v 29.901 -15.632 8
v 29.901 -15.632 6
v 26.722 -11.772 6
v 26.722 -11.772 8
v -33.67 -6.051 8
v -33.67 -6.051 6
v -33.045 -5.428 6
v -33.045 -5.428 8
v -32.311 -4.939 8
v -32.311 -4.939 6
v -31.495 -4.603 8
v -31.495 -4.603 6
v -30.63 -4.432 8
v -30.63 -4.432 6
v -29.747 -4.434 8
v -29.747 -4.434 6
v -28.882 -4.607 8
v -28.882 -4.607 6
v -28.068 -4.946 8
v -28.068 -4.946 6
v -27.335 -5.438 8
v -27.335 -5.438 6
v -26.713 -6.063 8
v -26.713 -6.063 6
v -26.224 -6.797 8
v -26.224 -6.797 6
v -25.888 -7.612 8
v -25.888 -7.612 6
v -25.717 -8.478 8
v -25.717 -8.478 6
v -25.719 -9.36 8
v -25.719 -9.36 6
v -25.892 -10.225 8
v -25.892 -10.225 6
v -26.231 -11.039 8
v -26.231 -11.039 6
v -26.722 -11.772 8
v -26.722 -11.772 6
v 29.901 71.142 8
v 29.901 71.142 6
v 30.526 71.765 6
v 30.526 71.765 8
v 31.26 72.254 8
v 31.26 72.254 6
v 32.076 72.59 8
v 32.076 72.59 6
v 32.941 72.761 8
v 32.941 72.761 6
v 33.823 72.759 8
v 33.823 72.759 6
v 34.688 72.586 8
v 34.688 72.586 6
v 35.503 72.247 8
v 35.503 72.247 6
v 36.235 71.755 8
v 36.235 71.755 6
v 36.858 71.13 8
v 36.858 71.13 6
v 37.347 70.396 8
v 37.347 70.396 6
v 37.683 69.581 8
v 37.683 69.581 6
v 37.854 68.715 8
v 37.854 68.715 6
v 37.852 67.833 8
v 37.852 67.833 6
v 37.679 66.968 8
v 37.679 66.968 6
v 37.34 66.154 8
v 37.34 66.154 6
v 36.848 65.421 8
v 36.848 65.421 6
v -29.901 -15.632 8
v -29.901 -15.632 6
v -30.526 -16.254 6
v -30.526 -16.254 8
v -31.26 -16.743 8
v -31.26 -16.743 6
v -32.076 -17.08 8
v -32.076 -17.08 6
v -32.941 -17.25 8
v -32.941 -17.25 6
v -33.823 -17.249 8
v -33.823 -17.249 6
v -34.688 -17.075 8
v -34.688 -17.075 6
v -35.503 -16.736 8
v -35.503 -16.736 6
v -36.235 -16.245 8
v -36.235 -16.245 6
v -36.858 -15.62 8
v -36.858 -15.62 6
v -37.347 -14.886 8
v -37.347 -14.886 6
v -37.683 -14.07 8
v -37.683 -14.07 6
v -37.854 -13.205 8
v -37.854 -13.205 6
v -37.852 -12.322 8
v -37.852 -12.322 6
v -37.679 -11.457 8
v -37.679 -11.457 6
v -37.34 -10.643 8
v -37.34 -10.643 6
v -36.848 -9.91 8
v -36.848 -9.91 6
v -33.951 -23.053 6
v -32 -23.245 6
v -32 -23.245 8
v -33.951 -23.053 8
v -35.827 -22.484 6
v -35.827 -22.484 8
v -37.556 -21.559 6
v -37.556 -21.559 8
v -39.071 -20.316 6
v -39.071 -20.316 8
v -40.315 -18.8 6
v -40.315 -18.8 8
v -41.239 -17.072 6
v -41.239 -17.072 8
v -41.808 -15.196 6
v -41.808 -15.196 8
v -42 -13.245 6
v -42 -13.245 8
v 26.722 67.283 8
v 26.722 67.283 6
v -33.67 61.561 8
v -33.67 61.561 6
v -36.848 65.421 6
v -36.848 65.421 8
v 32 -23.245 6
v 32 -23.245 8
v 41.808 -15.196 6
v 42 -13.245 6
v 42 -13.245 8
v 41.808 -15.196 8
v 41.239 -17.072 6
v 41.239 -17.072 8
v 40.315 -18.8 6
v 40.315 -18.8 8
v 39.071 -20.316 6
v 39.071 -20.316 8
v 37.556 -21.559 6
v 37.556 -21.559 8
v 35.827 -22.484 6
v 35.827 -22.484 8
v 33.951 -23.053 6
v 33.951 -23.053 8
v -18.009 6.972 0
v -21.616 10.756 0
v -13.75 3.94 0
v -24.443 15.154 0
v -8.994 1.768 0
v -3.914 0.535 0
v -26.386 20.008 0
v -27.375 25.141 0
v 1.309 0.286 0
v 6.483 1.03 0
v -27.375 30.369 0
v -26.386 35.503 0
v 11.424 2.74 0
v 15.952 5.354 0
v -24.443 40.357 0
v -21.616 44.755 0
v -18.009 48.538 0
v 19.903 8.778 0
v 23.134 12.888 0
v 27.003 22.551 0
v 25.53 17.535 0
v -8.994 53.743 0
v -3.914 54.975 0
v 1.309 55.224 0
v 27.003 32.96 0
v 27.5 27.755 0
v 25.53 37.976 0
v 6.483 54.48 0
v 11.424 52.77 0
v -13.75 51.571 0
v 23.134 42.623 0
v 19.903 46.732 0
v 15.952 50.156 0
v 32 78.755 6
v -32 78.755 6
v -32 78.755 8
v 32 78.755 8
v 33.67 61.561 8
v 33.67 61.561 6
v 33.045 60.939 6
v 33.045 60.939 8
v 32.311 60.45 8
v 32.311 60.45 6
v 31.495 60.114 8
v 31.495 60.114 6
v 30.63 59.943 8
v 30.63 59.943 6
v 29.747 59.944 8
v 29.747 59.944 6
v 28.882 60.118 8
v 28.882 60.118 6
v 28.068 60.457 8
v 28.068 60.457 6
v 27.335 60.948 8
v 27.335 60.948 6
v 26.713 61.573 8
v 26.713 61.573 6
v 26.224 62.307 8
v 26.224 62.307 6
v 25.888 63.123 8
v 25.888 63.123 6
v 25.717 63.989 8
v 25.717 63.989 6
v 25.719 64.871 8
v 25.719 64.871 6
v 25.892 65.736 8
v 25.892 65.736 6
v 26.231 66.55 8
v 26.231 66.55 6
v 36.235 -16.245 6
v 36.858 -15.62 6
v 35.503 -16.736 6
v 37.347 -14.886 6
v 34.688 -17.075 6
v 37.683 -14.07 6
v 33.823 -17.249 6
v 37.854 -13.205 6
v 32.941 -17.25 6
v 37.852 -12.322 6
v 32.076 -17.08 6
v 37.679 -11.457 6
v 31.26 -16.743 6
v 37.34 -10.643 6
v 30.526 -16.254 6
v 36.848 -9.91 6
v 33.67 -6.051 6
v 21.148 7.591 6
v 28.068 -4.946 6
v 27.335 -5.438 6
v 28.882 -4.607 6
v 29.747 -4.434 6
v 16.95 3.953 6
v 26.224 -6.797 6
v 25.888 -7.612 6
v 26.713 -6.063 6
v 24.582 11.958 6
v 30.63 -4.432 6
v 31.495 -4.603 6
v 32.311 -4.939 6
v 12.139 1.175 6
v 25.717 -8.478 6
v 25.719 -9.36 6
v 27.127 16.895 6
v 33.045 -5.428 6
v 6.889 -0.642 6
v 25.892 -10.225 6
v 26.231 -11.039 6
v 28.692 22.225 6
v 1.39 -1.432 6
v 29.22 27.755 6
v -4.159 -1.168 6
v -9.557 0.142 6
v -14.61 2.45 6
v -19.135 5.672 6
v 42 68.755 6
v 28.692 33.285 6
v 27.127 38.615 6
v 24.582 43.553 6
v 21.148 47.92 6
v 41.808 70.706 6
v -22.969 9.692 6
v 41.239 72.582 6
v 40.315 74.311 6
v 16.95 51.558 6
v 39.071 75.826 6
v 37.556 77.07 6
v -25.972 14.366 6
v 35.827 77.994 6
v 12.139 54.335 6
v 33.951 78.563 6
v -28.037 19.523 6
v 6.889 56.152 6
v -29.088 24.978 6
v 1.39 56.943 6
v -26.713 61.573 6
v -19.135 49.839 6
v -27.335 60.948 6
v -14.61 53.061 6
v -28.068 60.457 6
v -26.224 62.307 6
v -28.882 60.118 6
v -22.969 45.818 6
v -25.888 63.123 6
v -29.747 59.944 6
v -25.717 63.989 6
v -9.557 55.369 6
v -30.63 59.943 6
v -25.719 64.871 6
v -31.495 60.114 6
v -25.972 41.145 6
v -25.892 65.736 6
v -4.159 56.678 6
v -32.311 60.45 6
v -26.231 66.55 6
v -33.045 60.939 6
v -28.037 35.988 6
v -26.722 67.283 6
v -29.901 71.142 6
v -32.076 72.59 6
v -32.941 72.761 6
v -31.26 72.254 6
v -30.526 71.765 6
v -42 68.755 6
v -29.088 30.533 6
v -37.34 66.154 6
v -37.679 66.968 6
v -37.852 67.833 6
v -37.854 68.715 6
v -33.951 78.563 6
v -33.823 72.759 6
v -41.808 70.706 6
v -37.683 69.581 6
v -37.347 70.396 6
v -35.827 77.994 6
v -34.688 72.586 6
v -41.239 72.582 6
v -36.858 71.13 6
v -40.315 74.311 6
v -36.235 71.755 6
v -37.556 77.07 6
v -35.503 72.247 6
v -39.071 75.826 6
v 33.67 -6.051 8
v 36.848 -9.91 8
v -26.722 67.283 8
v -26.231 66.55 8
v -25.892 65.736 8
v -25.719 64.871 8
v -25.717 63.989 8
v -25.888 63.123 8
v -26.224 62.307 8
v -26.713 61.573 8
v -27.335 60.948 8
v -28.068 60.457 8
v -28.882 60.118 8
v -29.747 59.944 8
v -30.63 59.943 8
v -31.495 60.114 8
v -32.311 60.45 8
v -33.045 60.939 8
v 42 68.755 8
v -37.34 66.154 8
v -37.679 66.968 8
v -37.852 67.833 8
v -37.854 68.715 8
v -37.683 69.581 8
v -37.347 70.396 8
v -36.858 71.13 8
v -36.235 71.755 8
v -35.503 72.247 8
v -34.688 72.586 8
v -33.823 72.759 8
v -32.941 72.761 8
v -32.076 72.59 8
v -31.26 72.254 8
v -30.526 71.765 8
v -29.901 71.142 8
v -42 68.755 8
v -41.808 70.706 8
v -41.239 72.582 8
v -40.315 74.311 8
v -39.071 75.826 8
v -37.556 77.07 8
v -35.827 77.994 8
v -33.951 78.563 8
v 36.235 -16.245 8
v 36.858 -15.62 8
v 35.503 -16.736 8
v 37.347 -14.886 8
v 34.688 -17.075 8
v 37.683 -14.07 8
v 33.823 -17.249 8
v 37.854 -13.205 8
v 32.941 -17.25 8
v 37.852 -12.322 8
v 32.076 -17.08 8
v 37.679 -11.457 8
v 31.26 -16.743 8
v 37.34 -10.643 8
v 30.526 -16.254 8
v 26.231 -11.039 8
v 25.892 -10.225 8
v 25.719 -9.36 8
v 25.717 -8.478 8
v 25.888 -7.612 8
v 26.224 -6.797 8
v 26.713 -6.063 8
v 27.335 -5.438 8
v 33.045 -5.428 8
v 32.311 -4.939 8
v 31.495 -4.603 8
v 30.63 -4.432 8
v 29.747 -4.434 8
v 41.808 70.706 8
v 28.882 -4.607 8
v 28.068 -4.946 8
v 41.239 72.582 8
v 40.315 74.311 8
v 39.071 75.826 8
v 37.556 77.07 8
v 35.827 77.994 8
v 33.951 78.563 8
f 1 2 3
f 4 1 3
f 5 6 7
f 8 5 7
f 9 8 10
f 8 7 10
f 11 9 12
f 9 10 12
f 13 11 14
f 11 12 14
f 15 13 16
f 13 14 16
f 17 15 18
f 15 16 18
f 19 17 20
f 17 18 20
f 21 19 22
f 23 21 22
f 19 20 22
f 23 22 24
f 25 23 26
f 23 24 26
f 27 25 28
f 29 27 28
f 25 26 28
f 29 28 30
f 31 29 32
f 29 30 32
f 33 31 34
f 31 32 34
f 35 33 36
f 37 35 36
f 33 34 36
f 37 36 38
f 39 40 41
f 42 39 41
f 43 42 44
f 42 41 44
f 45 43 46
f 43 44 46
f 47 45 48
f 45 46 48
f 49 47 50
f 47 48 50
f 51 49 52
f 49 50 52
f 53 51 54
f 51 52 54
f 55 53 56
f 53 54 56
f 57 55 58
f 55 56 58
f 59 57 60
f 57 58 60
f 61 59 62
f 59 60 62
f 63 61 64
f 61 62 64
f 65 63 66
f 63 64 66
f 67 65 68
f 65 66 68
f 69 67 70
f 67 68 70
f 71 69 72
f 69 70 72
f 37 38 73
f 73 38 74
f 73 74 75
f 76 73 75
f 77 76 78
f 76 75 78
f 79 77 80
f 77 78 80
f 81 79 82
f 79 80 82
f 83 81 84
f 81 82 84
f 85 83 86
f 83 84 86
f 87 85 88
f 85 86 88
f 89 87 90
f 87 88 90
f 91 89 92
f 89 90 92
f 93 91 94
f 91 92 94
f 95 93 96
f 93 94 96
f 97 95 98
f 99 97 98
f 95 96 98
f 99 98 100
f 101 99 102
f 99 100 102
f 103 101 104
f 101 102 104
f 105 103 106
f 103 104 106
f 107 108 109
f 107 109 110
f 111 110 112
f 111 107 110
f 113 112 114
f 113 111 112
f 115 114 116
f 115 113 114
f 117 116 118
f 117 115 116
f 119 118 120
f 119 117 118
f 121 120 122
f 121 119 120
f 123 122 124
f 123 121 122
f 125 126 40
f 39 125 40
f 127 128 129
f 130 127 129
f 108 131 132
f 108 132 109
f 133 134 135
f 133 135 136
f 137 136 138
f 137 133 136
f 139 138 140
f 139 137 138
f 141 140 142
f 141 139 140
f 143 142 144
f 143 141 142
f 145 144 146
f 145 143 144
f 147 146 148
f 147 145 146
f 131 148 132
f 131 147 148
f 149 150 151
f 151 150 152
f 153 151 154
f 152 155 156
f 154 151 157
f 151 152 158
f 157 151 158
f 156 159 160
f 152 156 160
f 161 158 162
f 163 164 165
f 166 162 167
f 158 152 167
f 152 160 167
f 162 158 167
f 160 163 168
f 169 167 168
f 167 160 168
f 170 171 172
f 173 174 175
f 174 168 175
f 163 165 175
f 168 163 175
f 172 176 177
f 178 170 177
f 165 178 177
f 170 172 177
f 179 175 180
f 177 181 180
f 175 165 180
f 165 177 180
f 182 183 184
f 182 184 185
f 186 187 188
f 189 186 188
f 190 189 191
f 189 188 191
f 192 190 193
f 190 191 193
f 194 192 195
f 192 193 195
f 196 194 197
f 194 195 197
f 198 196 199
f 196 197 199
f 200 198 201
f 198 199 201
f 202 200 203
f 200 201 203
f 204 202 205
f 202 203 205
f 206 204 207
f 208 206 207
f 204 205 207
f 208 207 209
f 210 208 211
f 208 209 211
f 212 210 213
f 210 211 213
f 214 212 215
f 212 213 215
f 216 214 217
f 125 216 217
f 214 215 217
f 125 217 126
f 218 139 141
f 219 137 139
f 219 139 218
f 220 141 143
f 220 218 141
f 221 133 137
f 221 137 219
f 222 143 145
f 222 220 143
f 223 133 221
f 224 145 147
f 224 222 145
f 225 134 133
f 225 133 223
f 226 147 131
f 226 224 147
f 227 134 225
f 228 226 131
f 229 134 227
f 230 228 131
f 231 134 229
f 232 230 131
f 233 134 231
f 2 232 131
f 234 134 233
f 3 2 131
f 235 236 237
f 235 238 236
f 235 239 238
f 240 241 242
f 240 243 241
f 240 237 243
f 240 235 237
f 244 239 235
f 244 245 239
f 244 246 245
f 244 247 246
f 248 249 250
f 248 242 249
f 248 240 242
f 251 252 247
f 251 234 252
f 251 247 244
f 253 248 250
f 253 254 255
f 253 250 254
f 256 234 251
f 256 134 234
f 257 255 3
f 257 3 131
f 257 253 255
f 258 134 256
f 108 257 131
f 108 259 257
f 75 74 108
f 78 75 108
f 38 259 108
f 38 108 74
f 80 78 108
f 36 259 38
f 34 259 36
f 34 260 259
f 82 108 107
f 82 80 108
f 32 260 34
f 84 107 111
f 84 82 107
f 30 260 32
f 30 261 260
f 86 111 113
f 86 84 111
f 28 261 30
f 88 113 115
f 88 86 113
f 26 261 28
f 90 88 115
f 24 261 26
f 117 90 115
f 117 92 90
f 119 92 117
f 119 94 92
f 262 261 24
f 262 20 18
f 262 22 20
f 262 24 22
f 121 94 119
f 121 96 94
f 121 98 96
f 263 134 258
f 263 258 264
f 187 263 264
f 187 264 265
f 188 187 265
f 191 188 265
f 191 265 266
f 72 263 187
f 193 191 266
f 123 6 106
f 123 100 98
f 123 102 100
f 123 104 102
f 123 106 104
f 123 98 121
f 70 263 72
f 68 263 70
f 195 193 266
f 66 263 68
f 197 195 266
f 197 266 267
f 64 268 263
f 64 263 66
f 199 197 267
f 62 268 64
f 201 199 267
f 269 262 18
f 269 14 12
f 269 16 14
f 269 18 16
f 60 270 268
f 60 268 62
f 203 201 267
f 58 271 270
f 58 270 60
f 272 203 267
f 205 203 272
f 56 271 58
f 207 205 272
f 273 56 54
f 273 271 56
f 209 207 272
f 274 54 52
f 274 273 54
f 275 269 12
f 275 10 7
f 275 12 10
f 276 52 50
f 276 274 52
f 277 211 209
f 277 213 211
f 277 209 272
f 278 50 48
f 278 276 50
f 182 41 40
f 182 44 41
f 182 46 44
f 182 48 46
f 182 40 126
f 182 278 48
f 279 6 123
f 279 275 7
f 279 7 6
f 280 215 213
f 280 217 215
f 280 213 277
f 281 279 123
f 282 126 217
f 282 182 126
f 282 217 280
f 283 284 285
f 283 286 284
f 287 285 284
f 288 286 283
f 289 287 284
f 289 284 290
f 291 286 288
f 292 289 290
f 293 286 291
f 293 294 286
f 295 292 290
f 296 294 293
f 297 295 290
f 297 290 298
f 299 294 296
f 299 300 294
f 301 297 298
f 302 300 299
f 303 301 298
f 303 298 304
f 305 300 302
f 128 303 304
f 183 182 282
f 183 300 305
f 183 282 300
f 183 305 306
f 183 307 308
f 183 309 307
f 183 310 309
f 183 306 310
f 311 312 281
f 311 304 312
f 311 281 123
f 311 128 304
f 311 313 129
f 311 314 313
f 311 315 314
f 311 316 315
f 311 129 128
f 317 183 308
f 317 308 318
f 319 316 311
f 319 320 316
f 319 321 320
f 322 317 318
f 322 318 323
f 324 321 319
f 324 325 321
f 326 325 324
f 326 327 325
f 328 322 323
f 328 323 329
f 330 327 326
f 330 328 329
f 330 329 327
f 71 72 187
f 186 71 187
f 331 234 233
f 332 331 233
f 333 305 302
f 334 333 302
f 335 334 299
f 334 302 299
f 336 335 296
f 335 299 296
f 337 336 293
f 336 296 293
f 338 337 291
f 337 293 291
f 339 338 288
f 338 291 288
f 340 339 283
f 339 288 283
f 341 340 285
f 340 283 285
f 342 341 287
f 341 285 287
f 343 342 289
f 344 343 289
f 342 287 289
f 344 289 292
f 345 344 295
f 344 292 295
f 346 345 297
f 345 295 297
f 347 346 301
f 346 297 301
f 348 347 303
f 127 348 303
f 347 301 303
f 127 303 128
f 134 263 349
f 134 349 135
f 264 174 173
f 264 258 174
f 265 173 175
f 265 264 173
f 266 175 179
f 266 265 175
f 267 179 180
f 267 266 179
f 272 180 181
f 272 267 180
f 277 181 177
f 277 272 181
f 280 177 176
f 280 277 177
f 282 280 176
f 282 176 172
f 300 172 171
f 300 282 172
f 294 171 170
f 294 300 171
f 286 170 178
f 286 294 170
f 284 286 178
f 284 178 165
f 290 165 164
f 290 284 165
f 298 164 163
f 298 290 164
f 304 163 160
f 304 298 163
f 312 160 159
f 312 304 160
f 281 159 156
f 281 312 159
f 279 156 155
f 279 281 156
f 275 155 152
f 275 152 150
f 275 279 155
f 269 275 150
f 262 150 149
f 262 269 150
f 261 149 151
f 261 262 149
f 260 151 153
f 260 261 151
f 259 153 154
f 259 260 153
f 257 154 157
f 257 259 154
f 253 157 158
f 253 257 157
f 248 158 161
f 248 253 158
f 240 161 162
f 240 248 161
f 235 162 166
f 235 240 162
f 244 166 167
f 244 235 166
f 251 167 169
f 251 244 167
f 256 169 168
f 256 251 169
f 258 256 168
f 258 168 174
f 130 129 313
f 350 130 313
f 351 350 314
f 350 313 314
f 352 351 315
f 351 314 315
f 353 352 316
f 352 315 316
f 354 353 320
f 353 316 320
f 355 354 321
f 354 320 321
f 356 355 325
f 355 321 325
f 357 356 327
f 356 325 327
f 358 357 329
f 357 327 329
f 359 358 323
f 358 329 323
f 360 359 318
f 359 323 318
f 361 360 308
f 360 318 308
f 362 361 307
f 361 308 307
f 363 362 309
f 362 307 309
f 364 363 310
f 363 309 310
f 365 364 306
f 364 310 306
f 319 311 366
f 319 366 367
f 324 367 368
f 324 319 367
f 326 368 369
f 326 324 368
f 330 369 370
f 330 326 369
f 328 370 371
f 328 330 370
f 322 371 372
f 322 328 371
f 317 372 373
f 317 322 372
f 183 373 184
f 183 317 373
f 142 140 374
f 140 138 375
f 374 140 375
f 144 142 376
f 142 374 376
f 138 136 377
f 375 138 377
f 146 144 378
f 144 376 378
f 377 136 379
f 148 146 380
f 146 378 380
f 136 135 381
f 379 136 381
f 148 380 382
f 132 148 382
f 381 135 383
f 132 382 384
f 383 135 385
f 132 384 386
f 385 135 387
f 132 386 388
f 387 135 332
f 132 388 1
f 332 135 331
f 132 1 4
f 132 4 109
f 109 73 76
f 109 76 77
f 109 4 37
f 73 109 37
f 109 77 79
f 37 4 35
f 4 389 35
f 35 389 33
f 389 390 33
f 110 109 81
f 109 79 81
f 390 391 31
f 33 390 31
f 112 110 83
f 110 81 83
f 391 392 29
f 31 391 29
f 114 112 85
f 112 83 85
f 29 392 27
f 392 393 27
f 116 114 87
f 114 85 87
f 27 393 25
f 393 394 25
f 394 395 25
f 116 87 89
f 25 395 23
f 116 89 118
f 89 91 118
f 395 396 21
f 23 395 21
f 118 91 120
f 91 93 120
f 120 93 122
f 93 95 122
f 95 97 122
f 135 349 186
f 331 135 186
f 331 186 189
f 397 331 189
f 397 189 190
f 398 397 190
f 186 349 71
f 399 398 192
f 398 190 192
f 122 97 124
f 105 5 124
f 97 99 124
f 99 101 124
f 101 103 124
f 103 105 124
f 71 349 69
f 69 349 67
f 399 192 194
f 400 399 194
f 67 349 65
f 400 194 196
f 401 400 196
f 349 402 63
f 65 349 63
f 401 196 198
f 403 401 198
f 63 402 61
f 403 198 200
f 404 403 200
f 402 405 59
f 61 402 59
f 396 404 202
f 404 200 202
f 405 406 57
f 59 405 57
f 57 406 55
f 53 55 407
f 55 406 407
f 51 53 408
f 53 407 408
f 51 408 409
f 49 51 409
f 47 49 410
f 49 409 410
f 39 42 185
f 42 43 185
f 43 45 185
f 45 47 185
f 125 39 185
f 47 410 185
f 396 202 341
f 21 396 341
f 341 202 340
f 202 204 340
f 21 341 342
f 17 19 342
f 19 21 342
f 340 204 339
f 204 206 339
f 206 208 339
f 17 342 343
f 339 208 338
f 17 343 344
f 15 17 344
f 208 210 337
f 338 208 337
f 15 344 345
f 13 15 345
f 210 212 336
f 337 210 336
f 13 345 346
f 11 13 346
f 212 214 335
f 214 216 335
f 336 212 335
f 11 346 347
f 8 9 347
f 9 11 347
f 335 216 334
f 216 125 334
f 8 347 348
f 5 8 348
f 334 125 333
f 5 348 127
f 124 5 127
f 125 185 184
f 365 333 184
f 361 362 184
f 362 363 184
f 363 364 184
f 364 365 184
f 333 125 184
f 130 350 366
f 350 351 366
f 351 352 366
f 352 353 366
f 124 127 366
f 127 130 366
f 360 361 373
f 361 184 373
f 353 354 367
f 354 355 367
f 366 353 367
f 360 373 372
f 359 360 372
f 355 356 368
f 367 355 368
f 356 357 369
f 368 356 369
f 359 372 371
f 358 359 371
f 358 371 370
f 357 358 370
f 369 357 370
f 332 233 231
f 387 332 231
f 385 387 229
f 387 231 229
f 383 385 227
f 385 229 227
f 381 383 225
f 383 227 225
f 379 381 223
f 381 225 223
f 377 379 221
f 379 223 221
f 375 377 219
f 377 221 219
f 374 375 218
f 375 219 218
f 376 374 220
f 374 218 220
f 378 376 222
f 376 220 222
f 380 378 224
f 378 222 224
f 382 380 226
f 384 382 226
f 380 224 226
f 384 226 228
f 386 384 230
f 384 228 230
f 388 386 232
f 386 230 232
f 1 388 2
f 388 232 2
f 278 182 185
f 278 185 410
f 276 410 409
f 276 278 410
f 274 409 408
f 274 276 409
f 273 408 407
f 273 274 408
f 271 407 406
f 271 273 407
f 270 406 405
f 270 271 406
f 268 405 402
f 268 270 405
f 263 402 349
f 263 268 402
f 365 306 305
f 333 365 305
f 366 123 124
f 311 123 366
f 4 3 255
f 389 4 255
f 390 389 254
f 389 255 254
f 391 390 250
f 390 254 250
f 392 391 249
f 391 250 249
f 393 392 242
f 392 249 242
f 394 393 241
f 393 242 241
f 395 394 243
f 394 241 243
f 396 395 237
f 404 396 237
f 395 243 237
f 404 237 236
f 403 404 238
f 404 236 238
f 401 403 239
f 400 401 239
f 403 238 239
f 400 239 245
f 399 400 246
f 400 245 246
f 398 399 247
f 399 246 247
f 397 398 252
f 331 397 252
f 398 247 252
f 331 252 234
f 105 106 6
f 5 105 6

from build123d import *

# Parameters (mm, degrees)
SKETCH_1_R      = 27.5
EXTRUDE_1_DEPTH = 6
EXTRUDE_1_TAPER = -16
EXTRUDE_2_DEPTH = 2


with BuildPart() as part:
    # Эскиз1 → Бобышка-Вытянуть1 (new body)
    with BuildSketch(Plane.XY):
        with Locations((0, 27.755280905)):
            Circle(SKETCH_1_R)
    extrude(amount=EXTRUDE_1_DEPTH, taper=EXTRUDE_1_TAPER)

    # Эскиз3 → Бобышка-Вытянуть2 (add)
    with BuildSketch(Plane.XY.offset(6)):
        with BuildLine():
            Line((-32, 78.755280905), (32, 78.755280905))
            ThreePointArc((32, 78.755280905), (39.071067812, 75.826348716), (42, 68.755280905))
            Line((42, 68.755280905), (42, -13.244719095))
            ThreePointArc((42, -13.244719095), (39.071067812, -20.315786907), (32, -23.244719095))
            Line((32, -23.244719095), (-32, -23.244719095))
            ThreePointArc((-32, -23.244719095), (-39.071067812, -20.315786907), (-42, -13.244719095))
            Line((-42, -13.244719095), (-42, 68.755280905))
            ThreePointArc((-42, 68.755280905), (-39.071067812, 75.826348716), (-32, 78.755280905))
        make_face()
        with BuildLine():
            Line((-29.900944715, 71.142300912), (-26.722408451, 67.282649734))
            ThreePointArc((-26.722408451, 67.282649734), (-27.335411873, 60.948281036), (-33.669780571, 61.561284458))
            Line((-33.669780571, 61.561284458), (-36.848316835, 65.420935637))
            ThreePointArc((-36.848316835, 65.420935637), (-36.235313413, 71.755304335), (-29.900944715, 71.142300912))
        make_face(mode=Mode.SUBTRACT)
        with BuildLine():
            Line((36.848316835, 65.420935637), (33.669780571, 61.561284458))
            ThreePointArc((33.669780571, 61.561284458), (27.335411873, 60.948281036), (26.722408451, 67.282649734))
            Line((26.722408451, 67.282649734), (29.900944715, 71.142300912))
            ThreePointArc((29.900944715, 71.142300912), (36.235313413, 71.755304335), (36.848316835, 65.420935637))
        make_face(mode=Mode.SUBTRACT)
        with BuildLine():
            Line((29.900944715, -15.631739103), (26.722408451, -11.772087925))
            ThreePointArc((26.722408451, -11.772087925), (27.335411873, -5.437719227), (33.669780571, -6.050722649))
            Line((33.669780571, -6.050722649), (36.848316835, -9.910373827))
            ThreePointArc((36.848316835, -9.910373827), (36.235313413, -16.244742526), (29.900944715, -15.631739103))
        make_face(mode=Mode.SUBTRACT)
        with BuildLine():
            Line((-36.848316835, -9.910373827), (-33.669780571, -6.050722649))
            ThreePointArc((-33.669780571, -6.050722649), (-27.335411873, -5.437719227), (-26.722408451, -11.772087925))
            Line((-26.722408451, -11.772087925), (-29.900944715, -15.631739103))
            ThreePointArc((-29.900944715, -15.631739103), (-36.235313413, -16.244742526), (-36.848316835, -9.910373827))
        make_face(mode=Mode.SUBTRACT)
    extrude(amount=EXTRUDE_2_DEPTH)


solid = part.part
